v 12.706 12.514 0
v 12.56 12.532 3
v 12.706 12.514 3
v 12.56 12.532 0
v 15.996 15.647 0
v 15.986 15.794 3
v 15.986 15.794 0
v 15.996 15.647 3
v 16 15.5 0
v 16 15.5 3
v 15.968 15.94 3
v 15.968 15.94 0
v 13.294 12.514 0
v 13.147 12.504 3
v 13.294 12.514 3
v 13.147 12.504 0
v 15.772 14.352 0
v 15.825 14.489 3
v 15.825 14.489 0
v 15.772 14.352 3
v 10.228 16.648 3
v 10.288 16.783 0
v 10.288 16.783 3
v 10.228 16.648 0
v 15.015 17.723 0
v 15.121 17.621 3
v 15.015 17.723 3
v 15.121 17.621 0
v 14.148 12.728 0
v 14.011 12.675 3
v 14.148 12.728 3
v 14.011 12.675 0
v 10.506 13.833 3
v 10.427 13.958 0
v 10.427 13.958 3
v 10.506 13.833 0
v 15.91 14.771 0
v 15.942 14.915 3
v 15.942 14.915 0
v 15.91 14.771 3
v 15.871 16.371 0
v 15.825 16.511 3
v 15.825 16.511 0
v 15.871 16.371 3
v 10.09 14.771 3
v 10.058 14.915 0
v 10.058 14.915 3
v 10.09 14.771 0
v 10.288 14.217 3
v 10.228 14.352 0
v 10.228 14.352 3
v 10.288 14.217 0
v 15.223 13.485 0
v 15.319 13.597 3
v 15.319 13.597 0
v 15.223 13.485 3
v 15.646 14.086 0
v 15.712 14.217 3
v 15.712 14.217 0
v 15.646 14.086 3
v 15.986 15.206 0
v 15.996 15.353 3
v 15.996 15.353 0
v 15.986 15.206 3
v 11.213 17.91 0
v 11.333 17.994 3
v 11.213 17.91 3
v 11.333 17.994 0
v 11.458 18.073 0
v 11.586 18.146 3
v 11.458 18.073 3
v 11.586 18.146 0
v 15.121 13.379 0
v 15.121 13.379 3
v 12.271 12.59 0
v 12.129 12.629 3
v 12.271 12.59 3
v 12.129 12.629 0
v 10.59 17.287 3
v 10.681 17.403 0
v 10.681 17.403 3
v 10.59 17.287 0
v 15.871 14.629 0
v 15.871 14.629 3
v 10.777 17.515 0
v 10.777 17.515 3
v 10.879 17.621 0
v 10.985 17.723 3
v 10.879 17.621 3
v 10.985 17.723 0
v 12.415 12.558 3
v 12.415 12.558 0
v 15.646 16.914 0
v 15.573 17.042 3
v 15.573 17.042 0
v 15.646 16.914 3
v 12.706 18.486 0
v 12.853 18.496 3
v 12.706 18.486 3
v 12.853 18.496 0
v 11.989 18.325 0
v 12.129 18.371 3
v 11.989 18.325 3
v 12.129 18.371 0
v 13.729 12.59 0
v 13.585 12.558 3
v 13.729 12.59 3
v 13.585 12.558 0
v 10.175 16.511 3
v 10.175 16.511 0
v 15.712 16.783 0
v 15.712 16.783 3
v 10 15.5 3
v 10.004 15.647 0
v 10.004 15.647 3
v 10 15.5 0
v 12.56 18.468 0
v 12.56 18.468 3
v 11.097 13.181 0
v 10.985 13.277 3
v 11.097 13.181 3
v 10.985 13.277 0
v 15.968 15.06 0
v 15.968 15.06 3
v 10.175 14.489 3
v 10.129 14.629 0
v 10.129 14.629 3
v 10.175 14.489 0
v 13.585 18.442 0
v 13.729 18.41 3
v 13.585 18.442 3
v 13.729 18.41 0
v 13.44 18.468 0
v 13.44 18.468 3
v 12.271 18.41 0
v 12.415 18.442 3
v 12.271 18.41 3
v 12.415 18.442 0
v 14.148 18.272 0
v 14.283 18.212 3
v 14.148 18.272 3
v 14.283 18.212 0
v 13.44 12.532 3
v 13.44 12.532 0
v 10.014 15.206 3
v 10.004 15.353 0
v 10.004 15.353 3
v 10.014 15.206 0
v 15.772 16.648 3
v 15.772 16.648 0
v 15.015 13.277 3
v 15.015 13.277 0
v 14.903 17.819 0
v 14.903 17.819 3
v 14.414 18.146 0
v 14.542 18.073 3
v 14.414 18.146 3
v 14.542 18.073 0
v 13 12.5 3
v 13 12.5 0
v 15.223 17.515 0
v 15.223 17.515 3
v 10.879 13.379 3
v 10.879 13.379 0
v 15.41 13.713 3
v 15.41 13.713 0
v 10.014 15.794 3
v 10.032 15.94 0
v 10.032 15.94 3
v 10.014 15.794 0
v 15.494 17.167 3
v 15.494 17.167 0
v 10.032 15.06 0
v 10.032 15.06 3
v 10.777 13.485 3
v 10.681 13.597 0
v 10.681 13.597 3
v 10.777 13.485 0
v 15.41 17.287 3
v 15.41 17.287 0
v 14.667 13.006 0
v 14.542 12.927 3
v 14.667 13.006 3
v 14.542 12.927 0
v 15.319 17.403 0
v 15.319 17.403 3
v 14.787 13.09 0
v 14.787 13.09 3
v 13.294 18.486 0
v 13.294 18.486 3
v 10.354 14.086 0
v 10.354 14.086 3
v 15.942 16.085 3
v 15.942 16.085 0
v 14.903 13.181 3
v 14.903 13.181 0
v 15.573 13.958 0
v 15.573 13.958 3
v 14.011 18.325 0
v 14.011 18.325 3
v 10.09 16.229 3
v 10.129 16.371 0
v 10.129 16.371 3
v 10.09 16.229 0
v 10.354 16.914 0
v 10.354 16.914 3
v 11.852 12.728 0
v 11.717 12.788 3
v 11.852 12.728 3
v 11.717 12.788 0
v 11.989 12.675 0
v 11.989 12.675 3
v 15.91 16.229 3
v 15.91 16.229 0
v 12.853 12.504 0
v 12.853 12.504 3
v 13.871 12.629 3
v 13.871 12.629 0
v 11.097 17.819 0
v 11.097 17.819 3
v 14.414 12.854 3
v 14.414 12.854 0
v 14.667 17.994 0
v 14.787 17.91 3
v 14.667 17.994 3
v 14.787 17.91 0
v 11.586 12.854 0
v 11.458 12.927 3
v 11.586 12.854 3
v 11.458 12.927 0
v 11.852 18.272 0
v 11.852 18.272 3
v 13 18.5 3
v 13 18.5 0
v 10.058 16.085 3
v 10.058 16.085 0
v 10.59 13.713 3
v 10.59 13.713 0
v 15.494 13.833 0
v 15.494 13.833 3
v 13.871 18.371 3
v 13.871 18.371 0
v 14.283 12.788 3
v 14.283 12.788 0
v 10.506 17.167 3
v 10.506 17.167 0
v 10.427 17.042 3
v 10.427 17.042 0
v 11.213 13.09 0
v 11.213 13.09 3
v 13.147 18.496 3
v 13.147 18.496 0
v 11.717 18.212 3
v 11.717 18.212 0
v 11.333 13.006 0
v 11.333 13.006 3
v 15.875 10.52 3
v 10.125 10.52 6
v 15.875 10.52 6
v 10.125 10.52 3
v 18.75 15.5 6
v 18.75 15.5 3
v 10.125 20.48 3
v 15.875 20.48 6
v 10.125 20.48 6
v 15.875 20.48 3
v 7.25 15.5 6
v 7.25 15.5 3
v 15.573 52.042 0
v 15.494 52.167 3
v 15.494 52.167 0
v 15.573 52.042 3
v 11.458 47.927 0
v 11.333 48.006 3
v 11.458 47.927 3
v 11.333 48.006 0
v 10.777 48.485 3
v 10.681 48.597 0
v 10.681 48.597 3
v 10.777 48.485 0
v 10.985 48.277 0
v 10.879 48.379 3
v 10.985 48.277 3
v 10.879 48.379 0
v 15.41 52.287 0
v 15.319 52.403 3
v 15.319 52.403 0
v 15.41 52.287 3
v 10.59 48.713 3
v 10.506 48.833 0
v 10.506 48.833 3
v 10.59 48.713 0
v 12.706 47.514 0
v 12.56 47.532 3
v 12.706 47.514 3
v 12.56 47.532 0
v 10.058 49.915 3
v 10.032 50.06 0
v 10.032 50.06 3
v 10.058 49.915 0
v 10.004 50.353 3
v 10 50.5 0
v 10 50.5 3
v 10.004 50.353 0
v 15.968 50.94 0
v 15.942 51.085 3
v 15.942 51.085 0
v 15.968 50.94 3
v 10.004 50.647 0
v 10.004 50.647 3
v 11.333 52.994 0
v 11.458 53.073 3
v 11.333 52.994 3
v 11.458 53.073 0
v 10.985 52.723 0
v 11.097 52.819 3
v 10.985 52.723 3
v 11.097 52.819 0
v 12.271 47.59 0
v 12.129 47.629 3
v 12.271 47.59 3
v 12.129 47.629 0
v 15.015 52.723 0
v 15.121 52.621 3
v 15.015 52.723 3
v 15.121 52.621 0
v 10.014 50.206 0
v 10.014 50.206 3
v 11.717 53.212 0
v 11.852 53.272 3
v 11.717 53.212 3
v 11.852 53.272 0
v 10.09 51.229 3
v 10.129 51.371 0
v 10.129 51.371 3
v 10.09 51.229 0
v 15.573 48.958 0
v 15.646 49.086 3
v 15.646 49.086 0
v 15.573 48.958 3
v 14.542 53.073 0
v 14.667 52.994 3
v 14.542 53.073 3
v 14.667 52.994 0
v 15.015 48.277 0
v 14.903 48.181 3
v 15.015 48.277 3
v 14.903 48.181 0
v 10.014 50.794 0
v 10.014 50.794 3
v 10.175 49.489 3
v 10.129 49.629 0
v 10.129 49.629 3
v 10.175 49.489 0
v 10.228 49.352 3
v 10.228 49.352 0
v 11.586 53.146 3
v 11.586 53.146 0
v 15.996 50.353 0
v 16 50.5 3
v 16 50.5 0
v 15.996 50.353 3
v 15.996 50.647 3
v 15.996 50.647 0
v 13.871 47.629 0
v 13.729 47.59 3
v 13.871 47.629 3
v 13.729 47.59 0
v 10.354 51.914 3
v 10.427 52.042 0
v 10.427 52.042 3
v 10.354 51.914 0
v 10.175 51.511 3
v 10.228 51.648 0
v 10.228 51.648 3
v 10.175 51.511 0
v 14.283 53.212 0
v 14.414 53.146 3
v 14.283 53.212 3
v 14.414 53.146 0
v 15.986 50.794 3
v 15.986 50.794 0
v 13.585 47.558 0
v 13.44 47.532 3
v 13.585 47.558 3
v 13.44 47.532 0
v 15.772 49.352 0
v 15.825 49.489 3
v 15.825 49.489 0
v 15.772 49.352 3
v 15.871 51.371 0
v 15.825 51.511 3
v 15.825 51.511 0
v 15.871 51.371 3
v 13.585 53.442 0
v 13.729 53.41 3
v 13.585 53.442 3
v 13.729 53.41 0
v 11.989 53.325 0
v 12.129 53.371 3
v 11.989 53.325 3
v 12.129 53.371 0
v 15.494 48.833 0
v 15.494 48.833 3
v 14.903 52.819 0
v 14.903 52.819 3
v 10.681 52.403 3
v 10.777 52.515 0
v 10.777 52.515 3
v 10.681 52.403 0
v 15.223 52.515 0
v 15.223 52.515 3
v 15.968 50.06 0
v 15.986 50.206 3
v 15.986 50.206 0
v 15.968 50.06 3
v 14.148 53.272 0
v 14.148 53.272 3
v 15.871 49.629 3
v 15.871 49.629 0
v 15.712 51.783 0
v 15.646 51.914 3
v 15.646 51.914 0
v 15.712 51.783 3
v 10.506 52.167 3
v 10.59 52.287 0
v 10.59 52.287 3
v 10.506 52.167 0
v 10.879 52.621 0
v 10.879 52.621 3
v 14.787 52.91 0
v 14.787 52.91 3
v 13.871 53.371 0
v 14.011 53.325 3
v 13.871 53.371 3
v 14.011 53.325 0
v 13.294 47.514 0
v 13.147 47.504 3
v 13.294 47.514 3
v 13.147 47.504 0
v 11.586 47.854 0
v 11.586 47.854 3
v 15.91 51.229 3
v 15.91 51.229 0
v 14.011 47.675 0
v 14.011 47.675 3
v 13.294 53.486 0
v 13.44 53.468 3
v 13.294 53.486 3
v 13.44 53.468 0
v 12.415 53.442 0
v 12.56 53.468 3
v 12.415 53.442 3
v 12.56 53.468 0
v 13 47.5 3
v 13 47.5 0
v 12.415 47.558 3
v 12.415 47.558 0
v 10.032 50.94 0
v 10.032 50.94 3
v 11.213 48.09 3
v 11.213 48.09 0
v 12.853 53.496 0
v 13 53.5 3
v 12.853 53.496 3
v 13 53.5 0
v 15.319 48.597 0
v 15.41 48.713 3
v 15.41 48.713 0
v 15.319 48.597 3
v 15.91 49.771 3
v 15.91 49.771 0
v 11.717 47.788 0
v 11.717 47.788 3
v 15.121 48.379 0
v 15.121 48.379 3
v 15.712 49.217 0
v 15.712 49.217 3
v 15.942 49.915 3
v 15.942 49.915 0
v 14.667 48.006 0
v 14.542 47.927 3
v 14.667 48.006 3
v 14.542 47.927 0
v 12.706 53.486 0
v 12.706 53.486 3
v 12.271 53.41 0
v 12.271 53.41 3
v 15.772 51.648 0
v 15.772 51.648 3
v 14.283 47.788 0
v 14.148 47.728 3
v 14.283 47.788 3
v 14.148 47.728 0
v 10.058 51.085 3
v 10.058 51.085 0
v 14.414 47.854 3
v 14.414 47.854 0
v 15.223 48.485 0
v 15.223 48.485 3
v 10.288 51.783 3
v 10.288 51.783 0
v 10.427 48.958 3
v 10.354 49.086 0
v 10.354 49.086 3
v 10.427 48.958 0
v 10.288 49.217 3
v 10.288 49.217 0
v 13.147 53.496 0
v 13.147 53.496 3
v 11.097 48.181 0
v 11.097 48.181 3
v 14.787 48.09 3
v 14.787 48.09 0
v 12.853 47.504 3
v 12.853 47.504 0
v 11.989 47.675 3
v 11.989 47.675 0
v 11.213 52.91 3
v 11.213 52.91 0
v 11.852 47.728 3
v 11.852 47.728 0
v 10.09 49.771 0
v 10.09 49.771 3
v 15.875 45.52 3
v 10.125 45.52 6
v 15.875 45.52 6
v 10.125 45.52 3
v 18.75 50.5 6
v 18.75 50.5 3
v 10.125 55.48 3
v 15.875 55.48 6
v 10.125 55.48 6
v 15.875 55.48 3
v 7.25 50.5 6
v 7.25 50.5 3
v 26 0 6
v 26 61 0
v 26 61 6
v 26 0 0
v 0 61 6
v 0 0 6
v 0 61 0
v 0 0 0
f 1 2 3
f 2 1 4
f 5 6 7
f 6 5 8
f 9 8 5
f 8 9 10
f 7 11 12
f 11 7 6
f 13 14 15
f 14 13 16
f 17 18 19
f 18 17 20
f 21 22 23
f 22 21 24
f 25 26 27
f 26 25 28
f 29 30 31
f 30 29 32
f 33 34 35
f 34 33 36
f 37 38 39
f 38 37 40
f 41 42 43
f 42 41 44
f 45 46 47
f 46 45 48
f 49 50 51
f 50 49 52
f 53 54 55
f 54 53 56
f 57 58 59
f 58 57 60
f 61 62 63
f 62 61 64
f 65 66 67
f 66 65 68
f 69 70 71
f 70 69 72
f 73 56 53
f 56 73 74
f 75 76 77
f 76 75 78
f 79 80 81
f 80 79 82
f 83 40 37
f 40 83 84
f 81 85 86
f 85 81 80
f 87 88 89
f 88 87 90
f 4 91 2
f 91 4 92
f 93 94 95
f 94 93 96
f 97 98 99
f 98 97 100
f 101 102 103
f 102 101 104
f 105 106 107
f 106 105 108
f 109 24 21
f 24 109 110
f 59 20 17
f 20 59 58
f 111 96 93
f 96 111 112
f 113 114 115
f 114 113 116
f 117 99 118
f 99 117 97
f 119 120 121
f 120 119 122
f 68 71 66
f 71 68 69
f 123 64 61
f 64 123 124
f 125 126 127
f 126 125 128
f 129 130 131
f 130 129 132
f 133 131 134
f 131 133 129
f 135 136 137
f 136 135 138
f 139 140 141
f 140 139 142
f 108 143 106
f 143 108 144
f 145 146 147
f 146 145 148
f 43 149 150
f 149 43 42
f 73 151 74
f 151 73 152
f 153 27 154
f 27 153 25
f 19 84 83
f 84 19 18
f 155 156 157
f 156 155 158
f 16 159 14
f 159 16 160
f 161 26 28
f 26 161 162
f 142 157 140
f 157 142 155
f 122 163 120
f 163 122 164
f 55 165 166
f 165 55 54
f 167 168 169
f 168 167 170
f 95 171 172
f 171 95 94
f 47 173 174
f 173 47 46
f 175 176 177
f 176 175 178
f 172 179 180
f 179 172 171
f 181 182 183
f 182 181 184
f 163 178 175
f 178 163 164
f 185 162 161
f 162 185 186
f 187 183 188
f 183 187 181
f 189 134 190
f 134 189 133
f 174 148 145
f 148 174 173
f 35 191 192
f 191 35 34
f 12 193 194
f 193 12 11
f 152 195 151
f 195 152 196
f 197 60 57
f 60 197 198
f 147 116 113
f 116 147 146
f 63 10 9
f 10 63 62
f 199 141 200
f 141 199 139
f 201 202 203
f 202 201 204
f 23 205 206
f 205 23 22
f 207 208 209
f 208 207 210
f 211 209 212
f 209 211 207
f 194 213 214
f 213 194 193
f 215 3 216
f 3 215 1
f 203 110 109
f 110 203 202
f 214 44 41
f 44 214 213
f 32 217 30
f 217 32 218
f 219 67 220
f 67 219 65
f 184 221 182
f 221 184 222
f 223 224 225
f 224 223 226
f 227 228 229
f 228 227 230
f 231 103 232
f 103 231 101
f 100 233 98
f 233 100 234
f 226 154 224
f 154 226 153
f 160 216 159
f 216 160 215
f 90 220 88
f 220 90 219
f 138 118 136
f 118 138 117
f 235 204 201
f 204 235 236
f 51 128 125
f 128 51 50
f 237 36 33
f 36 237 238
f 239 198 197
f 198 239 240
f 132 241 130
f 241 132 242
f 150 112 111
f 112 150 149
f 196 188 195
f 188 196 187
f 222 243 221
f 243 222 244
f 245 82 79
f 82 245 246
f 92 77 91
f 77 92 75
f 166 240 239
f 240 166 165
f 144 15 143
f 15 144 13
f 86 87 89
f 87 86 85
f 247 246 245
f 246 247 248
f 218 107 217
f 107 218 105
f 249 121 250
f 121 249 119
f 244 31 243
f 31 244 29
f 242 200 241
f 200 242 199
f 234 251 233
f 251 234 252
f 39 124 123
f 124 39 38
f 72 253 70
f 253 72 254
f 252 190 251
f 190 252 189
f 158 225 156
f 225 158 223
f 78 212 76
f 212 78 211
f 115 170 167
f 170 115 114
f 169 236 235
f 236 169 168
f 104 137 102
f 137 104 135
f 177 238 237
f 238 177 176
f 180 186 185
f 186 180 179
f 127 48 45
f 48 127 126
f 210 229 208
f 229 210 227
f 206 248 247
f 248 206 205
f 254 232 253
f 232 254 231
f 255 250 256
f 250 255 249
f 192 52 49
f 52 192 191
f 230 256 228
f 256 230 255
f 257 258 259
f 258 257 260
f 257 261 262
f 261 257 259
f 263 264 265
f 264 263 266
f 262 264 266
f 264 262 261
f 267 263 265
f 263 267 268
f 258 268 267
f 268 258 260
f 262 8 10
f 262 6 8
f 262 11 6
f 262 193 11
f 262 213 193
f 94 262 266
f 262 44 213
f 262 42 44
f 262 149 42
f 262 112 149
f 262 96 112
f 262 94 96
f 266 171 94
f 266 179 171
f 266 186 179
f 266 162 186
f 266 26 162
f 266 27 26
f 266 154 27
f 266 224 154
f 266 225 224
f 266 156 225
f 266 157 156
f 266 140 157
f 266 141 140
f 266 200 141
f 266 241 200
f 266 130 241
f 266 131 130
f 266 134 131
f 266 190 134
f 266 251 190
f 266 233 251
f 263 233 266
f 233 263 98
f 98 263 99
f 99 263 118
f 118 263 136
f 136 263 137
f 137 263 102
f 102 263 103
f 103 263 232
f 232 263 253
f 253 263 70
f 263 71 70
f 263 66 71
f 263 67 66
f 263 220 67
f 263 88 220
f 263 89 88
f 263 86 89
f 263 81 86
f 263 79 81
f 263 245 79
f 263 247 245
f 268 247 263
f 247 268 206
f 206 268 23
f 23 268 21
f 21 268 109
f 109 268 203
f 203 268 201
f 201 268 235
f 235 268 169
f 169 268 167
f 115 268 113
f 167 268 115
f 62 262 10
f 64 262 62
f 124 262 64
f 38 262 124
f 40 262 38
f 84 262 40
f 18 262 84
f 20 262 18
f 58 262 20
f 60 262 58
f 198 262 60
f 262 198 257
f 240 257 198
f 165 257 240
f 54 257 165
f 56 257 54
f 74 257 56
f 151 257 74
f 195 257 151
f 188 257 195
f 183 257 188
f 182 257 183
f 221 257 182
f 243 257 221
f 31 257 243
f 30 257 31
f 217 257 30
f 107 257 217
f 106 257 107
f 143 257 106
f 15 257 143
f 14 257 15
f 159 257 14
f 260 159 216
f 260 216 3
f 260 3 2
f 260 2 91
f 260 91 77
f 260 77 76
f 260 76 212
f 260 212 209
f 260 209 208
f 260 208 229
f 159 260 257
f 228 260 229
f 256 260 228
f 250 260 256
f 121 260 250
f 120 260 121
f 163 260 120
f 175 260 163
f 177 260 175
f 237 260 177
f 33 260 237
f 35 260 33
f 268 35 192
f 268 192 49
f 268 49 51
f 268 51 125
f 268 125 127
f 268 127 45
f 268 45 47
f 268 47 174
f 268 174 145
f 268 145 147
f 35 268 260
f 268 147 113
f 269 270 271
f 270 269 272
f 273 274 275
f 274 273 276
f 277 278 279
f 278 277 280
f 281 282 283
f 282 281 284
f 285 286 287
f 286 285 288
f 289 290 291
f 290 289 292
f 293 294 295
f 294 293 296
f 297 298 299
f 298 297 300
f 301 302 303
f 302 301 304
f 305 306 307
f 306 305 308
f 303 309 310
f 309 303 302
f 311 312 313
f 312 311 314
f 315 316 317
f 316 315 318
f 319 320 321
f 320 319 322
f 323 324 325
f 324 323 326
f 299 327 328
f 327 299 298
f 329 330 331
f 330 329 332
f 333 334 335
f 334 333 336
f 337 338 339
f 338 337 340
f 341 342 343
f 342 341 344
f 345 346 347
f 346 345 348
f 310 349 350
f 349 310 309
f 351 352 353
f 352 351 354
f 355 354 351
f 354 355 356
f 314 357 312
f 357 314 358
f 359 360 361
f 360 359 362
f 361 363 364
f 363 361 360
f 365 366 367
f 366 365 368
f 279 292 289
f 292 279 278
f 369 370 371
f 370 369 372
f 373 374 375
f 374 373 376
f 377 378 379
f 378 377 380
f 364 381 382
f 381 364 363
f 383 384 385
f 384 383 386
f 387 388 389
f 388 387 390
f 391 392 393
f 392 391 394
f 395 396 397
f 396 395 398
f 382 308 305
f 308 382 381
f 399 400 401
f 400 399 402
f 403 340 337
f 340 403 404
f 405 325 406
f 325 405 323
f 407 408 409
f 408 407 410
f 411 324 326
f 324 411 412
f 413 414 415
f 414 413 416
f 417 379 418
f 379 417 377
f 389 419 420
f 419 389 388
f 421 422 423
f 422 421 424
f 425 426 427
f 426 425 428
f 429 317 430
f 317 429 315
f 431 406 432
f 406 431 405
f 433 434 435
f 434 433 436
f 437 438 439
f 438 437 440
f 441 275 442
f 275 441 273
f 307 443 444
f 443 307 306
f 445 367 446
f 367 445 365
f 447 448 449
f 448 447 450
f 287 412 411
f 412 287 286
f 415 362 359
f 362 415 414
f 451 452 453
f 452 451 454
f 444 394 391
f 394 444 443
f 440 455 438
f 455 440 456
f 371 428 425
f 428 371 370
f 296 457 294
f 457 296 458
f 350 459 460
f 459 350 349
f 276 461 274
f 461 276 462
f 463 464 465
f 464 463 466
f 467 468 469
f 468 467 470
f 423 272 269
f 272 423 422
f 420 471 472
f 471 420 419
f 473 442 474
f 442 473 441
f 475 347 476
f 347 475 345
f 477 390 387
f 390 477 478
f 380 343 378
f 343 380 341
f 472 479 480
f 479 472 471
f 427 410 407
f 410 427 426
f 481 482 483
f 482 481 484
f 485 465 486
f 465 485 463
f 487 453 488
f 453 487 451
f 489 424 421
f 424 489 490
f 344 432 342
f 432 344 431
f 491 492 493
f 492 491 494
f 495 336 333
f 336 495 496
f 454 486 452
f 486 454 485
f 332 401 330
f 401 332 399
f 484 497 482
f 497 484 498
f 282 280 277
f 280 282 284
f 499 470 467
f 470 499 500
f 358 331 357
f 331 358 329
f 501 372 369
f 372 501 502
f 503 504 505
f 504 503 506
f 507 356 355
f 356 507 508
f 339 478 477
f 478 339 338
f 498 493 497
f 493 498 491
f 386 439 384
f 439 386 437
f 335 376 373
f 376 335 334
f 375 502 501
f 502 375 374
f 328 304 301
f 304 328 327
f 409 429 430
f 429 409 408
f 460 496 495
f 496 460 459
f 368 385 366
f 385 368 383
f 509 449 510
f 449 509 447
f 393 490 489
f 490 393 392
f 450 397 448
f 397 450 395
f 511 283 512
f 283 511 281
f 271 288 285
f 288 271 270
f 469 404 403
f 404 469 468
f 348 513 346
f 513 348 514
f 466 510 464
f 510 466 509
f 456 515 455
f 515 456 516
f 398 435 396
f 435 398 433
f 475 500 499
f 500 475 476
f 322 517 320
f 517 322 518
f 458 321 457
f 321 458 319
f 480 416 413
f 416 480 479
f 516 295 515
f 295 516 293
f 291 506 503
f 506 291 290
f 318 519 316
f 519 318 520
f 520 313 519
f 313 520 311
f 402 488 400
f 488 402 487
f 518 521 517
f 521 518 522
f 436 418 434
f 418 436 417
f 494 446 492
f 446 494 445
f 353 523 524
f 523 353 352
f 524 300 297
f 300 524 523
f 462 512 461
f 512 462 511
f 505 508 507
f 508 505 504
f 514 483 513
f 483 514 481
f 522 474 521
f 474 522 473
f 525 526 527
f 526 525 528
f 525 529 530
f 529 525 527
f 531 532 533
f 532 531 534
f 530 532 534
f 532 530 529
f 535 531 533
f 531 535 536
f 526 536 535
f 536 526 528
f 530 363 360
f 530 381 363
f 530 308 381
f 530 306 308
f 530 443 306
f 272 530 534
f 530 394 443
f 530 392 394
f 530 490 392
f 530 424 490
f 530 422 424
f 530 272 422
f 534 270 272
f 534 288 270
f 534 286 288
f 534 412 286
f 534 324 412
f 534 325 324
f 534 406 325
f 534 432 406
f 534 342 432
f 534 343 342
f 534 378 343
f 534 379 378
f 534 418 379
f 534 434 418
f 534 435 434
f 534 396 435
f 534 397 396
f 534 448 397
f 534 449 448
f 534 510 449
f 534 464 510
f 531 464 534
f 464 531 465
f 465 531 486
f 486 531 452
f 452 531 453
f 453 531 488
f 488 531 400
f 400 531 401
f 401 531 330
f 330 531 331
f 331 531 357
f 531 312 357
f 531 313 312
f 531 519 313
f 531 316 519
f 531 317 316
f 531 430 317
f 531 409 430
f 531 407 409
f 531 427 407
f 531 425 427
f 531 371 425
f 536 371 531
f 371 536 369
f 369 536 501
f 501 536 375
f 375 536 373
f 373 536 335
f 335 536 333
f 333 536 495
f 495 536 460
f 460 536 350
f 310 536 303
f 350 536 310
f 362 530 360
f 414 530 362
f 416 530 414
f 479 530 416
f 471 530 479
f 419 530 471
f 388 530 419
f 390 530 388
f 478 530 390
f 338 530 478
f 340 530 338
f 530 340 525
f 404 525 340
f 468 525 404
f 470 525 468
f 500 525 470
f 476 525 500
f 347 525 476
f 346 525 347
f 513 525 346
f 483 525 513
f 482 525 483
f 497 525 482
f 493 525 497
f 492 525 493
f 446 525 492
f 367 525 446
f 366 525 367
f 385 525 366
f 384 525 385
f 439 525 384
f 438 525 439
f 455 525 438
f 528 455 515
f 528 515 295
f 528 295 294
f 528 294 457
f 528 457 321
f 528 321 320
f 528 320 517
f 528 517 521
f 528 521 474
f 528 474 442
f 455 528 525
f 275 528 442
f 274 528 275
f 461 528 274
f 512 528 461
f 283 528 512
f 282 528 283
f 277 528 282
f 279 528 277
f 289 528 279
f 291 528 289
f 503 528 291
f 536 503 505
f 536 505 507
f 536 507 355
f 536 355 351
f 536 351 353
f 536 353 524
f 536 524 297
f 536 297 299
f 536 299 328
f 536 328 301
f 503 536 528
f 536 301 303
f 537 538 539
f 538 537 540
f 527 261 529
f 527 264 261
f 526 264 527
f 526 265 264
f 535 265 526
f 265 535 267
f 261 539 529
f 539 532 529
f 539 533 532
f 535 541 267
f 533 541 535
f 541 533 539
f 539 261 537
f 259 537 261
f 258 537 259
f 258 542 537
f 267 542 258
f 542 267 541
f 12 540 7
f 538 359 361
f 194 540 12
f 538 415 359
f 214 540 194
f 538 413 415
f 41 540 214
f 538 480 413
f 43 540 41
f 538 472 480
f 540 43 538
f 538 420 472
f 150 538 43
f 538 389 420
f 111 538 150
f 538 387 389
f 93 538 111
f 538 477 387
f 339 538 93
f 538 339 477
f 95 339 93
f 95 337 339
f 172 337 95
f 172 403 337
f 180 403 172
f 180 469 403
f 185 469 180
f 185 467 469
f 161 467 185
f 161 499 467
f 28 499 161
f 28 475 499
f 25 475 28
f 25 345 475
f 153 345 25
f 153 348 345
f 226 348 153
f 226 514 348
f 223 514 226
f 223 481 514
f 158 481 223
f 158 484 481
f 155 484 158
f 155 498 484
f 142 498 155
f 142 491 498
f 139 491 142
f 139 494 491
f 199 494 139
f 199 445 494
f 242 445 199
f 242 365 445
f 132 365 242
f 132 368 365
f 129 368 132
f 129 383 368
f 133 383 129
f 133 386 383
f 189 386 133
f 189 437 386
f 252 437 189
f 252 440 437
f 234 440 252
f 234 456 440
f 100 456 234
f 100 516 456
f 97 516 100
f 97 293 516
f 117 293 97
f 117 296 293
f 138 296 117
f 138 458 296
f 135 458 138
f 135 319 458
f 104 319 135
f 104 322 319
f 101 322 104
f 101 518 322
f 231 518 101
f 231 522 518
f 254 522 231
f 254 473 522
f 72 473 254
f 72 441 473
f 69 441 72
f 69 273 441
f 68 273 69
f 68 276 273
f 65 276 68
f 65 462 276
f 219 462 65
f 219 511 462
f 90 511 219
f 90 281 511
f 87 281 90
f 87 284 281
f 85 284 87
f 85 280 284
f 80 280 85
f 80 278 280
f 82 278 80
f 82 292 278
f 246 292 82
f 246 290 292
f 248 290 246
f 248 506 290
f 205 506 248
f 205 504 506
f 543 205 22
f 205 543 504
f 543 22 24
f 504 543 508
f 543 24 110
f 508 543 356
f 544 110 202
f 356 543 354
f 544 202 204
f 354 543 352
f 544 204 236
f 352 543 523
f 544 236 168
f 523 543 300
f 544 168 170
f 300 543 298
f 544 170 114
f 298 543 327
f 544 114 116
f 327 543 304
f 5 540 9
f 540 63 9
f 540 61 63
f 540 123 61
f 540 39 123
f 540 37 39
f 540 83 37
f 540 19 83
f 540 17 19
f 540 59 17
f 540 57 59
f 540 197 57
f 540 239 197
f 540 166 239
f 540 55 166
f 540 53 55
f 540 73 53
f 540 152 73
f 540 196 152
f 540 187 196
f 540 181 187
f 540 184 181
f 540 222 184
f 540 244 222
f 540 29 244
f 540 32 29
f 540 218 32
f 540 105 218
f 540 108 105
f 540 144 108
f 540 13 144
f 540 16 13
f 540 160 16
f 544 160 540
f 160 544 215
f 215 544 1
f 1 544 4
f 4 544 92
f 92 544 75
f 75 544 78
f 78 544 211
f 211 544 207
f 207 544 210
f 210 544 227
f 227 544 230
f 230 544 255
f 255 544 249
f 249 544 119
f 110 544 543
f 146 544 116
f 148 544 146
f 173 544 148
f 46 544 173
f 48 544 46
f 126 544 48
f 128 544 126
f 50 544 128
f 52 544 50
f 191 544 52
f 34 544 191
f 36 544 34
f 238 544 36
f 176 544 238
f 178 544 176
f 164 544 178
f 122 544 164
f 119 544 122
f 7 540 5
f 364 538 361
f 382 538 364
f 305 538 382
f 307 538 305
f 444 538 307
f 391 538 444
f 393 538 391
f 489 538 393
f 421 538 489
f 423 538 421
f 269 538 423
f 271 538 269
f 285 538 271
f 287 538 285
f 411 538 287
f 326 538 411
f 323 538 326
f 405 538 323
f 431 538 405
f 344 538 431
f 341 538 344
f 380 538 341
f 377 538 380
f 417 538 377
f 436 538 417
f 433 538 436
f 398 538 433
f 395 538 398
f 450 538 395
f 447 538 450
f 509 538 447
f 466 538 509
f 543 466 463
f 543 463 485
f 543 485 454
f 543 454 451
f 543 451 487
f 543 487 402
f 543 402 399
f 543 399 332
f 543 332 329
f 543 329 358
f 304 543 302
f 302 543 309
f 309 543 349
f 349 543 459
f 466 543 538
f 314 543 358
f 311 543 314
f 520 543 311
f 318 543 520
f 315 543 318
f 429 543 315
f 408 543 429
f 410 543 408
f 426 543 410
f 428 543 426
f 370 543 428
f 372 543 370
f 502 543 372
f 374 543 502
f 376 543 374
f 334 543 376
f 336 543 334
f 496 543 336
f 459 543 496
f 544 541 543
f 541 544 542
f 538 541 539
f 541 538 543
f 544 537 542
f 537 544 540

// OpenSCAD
// file: settings.scad
/* true  -> place the controller housing to 
            right of the motor housing
   false -> place the controller housing below
            the motor housing
*/
side_by_side = false;

/* include a battery compartment */
with_battery_housing = true;

/* true  -> make the walls just tall enough for
            the motor
   false -> make the walls tall enough to enclose
            the controller
*/
min_height = false;

/* default wall/floor thickness */
thickness = 4;

battery_height = 23;
battery_length = 79;
battery_width = 37;
solar_controller_height = 15;
solar_controller_length = 50;

/* dimensions of NodeMCU + Motor Shield standing on edge */
controller_x = 62;
controller_y = 27;
controller_z = 45;

/* length of the motor body */
motor_l = 55;
/* diameter of the motor body */
motor_d = 26;

/* height of inserts placed above and below motor housing */
padding = 6;

/* length of thumbscrews inside the housing 
   (thumbscrews must be at thumbscrew_internal_l + thickness long)
*/
thumbscrew_internal_l = 14;

/* radius of thumbscrews */
thumbscrew_radius = 3;
/* offset of left hand thumbscrew from left inner edge of motor housing */
left_thumbscrew_offset = 8;
/* offset of right hand thumbscrew from right inner edge of motor housing */
right_thumbscrew_offset = 13;

/* radius of holes for wall mount screws */
mount_hole_r = 3;

/* internal dimensions of the motor housing. */
motor_housing_internal_x = max(motor_d + padding + thumbscrew_internal_l,
                                side_by_side ? controller_x : battery_length - (controller_y + thickness));
motor_housing_internal_y = max(motor_l + 5, side_by_side ? 0 : controller_x);

/* external dimensions of the motor housing */
motor_housing_total_x    = motor_housing_internal_x + 2*thickness;
motor_housing_total_y    = motor_housing_internal_y + 2*thickness;

internal_z = min_height ? motor_d : max(controller_z, motor_d);
total_z    = internal_z + thickness;

/* extra padding to center the motor in the Z dimension */
motor_pad = with_battery_housing ? (internal_z - solar_controller_height - motor_d) : 
            (internal_z - motor_d)/2;

mount_hole_offset = (motor_housing_internal_x / 6) ;
mount_hole_inset_r = 5;

/* settings for the thumbscrew plate */
thumbscrew_plate_inset_r= 5.75;
thumbscrew_plate_thickness = 6;
thumbscrew_plate_inset_h = 3;
thumbscrew_plate_l = motor_housing_internal_y - 1;
thumbscrew_plate_w = motor_d;
// main file
include <settings.scad>

module thumbscrew_plate(){
    difference(){
        cube([thumbscrew_plate_w, thumbscrew_plate_l, thumbscrew_plate_thickness]);
        union(){
            translate([thumbscrew_plate_w/2, thumbscrew_radius+right_thumbscrew_offset-0.5, -1]){
                cylinder(r = thumbscrew_radius, h = 2*thumbscrew_plate_thickness, $fn=128);
                translate([0,0,thumbscrew_plate_thickness-thumbscrew_plate_inset_h + 1]){
                    cylinder(r=thumbscrew_plate_inset_r, h=thumbscrew_plate_thickness, $fn=6);
                }
            }
            translate([thumbscrew_plate_w/2, thumbscrew_plate_l-(thumbscrew_radius+left_thumbscrew_offset-0.5), -1]){
                cylinder(r = thumbscrew_radius, h = 2*thumbscrew_plate_thickness, $fn = 128);
                translate([0,0, thumbscrew_plate_thickness-thumbscrew_plate_inset_h + 1]){
                    cylinder(r=thumbscrew_plate_inset_r, h=thumbscrew_plate_thickness, $fn=6);
                }
            }
        }
    }
}

thumbscrew_plate();
